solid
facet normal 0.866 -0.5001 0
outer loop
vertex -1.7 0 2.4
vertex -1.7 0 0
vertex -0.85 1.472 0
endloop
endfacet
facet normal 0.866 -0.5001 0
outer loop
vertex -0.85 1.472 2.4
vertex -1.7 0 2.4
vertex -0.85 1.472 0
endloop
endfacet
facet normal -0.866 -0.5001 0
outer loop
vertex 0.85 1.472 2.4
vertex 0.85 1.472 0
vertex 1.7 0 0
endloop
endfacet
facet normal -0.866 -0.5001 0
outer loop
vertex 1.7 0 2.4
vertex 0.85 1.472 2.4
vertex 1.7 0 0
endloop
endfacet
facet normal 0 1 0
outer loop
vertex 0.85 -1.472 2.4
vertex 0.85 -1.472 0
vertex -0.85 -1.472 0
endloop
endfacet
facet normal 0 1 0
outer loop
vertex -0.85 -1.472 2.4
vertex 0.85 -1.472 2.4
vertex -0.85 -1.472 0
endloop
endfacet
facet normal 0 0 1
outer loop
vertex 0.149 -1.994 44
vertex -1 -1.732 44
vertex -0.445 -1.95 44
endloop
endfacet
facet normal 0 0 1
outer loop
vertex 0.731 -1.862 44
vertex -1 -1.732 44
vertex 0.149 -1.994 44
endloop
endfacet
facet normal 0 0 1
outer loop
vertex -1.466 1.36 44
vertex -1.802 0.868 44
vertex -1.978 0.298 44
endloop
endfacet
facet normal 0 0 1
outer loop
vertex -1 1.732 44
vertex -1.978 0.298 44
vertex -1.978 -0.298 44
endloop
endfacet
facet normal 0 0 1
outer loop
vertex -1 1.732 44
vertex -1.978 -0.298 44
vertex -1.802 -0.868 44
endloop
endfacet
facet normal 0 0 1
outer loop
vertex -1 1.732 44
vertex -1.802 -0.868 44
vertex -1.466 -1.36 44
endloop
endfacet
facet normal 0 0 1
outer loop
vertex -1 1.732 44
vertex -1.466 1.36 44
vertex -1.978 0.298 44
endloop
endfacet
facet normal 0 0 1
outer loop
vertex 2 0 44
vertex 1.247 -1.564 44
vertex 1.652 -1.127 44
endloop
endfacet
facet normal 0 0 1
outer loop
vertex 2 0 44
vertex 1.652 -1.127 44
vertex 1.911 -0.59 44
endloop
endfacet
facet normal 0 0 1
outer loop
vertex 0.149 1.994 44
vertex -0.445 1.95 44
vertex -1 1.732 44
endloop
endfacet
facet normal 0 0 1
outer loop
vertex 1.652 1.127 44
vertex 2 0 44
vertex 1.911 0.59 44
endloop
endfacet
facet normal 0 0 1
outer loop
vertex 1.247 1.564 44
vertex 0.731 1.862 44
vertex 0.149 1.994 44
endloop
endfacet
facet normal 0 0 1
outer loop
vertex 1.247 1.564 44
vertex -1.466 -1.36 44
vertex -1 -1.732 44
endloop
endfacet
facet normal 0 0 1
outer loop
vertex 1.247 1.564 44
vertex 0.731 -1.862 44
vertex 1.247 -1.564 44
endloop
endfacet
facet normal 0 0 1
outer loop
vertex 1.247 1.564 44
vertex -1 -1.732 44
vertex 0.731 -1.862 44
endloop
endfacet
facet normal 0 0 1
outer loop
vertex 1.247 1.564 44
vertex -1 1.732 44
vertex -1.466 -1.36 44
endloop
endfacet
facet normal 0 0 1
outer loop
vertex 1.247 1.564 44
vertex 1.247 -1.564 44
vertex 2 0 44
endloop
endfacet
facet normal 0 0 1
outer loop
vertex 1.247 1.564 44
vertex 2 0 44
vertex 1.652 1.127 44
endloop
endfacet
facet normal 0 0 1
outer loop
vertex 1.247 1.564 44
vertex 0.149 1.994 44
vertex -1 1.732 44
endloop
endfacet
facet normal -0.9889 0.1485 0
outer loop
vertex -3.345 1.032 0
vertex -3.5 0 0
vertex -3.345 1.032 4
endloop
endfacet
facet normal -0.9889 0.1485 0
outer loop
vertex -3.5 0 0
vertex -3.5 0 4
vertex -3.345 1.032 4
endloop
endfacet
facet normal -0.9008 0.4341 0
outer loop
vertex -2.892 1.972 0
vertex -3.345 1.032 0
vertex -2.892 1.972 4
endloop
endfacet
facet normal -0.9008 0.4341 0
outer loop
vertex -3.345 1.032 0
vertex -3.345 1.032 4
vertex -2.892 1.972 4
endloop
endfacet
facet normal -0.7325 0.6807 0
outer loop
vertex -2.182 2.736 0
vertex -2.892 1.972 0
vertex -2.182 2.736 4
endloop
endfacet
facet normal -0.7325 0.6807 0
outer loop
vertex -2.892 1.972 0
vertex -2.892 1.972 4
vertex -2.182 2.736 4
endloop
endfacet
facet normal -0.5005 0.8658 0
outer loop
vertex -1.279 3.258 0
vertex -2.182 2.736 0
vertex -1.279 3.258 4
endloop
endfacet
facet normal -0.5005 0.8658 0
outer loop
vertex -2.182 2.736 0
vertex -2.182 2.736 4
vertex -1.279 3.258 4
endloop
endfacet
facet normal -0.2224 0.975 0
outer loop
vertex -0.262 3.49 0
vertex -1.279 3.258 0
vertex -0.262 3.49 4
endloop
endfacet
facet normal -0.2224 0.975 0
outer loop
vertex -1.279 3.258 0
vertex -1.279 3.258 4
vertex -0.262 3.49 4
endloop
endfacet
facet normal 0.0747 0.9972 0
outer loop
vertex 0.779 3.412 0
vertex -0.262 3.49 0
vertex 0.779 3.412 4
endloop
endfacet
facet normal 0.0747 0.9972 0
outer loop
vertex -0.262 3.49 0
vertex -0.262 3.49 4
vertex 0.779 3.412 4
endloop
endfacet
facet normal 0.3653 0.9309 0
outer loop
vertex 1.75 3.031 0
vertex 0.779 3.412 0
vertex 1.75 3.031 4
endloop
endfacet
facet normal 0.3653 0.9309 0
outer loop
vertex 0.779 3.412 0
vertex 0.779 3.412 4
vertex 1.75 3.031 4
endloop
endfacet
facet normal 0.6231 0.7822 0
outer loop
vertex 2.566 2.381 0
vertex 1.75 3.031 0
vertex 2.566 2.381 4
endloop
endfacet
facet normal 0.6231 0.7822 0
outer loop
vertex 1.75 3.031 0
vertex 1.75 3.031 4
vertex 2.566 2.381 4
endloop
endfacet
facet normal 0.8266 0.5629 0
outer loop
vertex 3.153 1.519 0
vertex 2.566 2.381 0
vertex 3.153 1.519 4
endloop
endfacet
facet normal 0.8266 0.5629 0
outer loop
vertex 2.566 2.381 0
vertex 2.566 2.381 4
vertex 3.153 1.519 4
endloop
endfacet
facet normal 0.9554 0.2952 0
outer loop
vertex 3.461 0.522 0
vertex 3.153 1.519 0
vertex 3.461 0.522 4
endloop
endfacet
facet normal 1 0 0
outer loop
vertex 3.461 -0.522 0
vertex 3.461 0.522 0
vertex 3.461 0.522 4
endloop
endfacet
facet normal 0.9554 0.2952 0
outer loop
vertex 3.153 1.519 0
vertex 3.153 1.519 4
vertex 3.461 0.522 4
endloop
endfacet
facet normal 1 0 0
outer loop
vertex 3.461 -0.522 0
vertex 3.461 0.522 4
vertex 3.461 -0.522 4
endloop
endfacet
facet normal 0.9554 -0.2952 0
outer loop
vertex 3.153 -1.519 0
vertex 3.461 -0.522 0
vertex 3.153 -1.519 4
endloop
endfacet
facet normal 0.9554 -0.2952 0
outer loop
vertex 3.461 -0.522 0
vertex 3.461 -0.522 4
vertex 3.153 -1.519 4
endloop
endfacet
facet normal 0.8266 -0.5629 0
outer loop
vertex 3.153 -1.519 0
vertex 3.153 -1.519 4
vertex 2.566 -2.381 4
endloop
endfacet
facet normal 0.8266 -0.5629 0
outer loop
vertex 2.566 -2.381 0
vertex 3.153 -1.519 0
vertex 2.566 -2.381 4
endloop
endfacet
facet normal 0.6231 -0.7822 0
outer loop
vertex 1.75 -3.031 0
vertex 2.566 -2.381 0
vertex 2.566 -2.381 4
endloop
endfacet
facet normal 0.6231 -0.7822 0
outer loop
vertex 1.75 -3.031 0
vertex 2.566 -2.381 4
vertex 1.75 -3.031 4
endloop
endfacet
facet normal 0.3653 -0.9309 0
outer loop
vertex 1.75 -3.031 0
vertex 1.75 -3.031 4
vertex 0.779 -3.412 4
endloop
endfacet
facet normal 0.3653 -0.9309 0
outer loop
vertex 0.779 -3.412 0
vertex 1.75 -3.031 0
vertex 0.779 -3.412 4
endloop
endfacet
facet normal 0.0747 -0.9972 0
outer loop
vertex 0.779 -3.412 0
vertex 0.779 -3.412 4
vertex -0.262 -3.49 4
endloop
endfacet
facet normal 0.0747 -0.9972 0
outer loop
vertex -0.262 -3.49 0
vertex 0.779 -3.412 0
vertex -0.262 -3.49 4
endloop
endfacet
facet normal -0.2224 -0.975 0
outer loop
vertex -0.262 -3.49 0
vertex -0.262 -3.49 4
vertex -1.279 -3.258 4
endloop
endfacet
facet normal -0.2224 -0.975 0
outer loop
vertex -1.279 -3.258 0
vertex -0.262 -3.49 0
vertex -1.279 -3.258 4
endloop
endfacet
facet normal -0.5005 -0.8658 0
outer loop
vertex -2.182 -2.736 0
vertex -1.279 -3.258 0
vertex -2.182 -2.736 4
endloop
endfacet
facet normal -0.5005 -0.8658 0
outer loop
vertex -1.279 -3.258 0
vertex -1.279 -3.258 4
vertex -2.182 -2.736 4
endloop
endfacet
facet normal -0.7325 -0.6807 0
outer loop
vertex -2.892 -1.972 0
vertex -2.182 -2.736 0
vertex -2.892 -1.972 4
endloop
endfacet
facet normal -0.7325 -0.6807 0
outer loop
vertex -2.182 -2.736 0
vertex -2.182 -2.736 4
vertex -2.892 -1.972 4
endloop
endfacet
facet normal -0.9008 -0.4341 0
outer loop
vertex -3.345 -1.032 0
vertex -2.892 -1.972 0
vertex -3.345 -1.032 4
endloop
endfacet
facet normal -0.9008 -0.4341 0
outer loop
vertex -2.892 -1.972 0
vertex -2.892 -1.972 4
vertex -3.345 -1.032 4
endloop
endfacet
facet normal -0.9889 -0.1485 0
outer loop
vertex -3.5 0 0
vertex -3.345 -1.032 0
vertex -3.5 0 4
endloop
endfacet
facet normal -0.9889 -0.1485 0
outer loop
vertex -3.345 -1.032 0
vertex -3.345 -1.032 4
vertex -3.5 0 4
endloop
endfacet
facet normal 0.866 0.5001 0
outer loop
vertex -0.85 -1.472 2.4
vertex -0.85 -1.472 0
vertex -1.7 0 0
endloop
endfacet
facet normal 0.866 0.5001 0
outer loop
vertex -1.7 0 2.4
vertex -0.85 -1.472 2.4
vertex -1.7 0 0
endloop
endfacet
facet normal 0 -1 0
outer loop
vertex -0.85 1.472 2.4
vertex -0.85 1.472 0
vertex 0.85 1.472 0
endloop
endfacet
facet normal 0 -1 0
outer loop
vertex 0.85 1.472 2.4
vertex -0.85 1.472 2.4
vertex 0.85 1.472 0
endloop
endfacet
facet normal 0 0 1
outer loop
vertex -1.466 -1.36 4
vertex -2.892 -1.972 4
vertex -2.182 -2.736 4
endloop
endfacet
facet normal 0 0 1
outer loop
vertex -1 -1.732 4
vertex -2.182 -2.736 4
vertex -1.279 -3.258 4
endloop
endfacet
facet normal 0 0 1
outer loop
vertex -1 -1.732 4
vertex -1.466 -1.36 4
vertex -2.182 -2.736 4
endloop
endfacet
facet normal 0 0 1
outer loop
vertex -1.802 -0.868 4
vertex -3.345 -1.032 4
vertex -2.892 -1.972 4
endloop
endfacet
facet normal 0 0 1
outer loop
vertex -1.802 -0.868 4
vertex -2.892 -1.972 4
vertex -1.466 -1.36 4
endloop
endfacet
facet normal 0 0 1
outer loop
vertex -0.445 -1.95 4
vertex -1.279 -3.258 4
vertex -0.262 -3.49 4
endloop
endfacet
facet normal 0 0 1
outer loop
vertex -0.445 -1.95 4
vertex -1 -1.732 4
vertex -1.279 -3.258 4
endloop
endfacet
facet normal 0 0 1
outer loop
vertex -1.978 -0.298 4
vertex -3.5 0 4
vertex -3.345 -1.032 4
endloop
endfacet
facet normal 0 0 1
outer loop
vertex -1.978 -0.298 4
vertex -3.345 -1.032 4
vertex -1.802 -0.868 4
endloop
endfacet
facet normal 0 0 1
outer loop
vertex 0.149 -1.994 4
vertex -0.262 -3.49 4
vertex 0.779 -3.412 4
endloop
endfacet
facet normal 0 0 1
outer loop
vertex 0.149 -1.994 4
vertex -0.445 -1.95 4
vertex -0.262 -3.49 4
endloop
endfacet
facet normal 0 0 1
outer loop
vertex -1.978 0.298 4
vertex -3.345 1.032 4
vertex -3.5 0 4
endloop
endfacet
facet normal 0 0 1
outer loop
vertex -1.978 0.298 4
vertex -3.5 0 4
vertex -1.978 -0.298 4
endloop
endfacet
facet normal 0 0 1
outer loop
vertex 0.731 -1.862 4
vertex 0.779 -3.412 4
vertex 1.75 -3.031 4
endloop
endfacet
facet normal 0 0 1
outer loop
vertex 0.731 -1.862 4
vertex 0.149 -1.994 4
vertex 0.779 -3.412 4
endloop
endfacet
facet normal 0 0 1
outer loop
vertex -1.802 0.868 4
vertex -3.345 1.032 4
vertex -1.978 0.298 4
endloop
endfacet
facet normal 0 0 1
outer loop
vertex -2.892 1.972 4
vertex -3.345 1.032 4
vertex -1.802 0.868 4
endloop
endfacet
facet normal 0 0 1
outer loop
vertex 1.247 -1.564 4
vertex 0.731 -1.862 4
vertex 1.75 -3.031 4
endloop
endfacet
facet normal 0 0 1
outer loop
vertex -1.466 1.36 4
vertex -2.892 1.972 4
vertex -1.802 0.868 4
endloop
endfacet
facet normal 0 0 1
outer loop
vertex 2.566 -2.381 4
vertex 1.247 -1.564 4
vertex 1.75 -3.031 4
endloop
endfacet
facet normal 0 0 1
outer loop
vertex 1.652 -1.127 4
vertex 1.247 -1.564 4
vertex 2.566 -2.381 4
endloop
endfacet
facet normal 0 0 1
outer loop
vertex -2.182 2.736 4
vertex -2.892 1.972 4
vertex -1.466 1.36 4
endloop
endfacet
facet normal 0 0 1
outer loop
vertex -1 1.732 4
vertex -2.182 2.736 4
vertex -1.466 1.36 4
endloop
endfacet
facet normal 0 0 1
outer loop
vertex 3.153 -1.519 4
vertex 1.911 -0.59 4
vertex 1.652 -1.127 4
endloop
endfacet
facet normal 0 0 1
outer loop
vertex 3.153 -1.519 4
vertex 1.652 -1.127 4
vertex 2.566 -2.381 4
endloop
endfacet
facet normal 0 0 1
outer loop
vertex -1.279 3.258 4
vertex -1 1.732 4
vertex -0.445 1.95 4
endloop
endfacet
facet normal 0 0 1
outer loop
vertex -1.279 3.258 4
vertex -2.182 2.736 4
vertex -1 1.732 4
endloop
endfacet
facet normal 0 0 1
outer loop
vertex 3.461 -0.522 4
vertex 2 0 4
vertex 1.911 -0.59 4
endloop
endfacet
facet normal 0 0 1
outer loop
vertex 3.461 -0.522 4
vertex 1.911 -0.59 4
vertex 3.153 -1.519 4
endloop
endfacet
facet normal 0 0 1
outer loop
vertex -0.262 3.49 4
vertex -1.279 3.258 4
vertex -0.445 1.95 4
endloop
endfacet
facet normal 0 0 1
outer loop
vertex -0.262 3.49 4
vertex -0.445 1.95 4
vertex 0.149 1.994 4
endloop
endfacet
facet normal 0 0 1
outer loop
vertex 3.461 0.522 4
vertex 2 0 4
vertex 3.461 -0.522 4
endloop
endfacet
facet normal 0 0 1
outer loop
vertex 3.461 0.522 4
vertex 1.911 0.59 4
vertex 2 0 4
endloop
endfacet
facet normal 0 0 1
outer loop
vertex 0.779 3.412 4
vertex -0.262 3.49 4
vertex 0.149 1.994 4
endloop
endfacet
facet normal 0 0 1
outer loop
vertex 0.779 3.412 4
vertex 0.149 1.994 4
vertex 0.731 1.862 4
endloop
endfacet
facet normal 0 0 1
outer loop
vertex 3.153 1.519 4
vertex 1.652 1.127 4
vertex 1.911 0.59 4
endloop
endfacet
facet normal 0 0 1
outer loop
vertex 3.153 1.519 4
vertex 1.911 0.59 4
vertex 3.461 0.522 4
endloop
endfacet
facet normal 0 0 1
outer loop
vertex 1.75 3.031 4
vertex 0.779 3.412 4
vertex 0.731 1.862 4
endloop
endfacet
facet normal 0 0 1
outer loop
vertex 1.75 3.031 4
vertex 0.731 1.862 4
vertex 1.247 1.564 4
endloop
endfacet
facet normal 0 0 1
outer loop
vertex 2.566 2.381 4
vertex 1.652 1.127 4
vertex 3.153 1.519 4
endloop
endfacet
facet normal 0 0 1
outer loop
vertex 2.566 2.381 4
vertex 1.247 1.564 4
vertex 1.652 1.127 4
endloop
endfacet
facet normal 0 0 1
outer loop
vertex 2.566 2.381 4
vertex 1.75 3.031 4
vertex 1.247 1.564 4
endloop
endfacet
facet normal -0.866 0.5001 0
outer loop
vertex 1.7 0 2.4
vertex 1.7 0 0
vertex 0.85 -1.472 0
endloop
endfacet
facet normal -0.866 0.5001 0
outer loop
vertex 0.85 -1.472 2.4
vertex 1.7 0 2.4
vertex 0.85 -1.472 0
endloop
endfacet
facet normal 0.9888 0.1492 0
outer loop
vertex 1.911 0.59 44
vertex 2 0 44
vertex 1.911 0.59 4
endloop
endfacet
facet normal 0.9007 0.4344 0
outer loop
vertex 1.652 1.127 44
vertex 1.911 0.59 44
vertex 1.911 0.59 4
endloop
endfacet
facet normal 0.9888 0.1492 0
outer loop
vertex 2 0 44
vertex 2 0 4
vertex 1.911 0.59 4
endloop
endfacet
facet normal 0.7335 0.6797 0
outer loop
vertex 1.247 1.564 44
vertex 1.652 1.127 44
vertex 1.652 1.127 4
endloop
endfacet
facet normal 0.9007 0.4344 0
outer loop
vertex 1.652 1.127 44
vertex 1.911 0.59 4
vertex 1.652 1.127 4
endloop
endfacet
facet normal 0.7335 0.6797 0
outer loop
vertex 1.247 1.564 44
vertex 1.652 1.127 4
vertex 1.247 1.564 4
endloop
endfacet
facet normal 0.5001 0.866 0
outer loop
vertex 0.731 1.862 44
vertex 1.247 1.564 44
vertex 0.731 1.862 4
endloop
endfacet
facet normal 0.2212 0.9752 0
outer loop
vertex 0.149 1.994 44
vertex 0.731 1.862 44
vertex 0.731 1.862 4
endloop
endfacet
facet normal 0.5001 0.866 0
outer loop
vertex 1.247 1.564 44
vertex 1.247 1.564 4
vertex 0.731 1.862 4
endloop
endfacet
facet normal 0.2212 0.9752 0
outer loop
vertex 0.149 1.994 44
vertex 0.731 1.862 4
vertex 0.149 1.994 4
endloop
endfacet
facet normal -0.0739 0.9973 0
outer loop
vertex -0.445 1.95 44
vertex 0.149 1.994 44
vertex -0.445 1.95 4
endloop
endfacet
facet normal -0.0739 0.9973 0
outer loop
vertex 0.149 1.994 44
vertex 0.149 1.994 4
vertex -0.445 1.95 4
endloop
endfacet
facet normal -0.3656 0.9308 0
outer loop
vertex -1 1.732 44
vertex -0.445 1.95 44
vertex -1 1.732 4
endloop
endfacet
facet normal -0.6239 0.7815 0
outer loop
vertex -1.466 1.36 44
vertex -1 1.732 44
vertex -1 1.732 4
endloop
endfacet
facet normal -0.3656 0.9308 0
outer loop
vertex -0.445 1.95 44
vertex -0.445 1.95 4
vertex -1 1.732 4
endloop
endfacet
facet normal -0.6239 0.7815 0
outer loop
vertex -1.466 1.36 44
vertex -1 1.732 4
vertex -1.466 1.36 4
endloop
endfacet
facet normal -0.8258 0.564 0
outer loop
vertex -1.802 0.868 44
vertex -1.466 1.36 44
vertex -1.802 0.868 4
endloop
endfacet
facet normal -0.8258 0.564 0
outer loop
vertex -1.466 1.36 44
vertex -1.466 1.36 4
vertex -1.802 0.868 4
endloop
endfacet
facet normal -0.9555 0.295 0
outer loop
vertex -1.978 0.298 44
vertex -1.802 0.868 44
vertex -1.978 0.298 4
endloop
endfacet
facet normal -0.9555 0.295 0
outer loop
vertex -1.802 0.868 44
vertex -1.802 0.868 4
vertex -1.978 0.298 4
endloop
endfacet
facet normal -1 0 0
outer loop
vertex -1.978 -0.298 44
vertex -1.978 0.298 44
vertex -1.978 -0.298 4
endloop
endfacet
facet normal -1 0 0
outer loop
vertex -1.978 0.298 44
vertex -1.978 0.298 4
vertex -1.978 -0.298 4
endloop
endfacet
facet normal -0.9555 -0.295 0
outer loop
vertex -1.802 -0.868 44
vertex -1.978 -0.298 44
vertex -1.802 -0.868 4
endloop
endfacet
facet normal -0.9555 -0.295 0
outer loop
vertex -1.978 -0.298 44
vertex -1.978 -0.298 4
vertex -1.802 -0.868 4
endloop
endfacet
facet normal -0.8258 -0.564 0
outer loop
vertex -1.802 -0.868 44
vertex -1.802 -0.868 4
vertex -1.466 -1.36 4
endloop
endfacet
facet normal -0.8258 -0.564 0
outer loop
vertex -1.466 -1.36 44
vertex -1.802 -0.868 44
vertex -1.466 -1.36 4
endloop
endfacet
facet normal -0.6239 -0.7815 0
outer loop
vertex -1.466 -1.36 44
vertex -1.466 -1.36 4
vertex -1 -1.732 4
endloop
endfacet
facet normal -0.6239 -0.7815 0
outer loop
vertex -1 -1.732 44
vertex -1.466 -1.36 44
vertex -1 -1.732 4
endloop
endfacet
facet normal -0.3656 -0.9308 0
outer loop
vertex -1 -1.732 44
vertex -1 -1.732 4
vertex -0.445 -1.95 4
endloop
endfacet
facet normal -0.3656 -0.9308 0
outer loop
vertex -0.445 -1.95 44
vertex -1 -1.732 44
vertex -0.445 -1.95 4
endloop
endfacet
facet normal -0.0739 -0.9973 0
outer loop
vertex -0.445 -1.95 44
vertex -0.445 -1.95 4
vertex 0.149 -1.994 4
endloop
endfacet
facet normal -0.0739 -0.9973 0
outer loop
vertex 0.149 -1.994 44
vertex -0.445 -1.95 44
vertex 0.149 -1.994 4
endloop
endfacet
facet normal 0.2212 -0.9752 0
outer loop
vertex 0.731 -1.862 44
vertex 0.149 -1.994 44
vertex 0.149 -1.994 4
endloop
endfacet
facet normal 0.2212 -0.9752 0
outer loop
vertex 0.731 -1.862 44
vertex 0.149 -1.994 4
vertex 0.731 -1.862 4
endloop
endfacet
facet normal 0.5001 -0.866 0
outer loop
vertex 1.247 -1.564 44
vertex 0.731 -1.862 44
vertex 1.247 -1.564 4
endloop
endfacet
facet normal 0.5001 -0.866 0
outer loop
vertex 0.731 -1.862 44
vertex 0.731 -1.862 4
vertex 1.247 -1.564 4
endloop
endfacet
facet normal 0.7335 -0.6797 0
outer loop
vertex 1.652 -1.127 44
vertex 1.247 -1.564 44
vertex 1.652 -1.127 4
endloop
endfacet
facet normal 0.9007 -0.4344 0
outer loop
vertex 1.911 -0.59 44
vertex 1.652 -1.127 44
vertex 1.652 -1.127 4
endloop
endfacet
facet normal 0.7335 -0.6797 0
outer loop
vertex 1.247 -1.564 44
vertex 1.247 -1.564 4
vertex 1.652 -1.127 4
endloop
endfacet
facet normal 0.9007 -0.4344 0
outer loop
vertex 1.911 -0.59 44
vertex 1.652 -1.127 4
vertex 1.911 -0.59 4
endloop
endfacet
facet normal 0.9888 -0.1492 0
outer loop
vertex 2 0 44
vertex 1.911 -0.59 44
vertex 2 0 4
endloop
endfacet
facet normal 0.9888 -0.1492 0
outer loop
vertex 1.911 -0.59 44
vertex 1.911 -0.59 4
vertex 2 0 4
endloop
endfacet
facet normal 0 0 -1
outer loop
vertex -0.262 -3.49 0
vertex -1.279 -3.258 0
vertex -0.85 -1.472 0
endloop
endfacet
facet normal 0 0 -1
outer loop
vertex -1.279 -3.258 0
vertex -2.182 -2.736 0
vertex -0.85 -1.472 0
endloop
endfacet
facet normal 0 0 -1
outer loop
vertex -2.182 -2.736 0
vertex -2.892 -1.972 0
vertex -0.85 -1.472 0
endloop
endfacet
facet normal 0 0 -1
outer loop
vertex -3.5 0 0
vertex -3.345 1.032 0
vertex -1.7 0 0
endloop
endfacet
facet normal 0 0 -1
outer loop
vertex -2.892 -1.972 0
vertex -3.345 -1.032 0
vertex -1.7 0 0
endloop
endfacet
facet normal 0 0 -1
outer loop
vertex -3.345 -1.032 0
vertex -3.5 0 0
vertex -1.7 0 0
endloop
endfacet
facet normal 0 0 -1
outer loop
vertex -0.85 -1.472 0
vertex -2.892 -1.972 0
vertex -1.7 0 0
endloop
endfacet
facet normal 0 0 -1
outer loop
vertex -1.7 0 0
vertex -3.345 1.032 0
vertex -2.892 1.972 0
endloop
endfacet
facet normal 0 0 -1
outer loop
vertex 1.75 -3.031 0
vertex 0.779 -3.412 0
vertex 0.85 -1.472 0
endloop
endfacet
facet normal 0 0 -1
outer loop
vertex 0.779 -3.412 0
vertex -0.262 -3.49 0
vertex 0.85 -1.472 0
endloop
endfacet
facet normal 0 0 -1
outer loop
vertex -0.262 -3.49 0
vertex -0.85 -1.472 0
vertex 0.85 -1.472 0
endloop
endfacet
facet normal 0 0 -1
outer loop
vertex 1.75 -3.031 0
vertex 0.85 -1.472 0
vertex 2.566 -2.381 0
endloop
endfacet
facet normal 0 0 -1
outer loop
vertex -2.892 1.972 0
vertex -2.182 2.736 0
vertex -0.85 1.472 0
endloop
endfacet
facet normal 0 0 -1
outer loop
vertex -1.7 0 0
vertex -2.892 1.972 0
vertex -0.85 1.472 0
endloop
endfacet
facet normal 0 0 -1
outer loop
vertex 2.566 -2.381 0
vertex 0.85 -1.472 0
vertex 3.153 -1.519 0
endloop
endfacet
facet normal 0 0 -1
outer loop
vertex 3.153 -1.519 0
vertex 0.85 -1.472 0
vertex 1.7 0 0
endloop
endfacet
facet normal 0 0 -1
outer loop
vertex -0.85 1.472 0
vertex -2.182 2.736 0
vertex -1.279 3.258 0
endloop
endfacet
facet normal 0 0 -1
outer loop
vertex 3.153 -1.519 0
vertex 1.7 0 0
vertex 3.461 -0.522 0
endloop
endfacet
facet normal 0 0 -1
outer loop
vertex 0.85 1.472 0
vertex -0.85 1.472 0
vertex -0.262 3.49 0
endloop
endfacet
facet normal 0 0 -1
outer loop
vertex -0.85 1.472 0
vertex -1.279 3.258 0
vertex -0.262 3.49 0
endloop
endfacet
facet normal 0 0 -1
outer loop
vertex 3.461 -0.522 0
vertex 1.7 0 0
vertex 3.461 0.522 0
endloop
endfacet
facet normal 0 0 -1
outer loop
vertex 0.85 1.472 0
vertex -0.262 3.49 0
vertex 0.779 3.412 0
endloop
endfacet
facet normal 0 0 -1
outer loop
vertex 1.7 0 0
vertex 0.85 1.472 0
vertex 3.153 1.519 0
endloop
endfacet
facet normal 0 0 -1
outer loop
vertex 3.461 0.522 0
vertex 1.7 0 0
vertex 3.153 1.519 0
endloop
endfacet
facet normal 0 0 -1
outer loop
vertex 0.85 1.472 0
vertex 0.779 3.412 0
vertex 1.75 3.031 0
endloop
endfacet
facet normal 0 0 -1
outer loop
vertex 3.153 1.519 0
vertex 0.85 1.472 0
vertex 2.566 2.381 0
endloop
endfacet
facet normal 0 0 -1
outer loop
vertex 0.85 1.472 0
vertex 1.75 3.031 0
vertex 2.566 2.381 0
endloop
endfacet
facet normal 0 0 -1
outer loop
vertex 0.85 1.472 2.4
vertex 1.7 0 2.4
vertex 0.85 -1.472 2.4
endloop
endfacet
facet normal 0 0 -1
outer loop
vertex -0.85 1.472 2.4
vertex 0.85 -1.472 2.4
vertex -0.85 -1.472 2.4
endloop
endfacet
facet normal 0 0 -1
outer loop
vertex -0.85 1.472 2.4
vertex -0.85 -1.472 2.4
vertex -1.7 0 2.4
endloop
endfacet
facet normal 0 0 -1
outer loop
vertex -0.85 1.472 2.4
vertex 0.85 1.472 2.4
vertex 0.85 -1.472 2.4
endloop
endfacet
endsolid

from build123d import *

# Parameters (mm, degrees)
SKETCH1_W           = 3.5
SKETCH1_H           = 4
SKETCH2_R           = 2
BOSS_EXTRUDE1_DEPTH = 20
SKETCH3_R           = 2
BOSS_EXTRUDE2_DEPTH = 20
CUT_EXTRUDE1_DEPTH  = 2.4


with BuildPart() as part:
    # Sketch1 → Revolve1 (revolve)
    with BuildSketch(Plane.XZ, mode=Mode.PRIVATE) as revolve1_sk:
        with Locations((1.75, 2)):
            Rectangle(SKETCH1_W, SKETCH1_H)
    revolve(revolve1_sk.sketch.rotate(Axis((0, 0, 4), (0, 0, -1)), 180), axis=Axis((0, 0, 4), (0, 0, -1)))

    # Sketch2 → Boss-Extrude1 (add)
    with BuildSketch(Plane.XY.offset(4)):
        Circle(SKETCH2_R)
    extrude(amount=BOSS_EXTRUDE1_DEPTH)

    # Sketch3 → Boss-Extrude2 (add)
    with BuildSketch(Plane.XY.offset(24)):
        Circle(SKETCH3_R)
    extrude(amount=BOSS_EXTRUDE2_DEPTH)

    # Sketch4 → Cut-Extrude1 (cut)
    with BuildSketch(Plane(origin=(0, 0, 0), x_dir=(-1, 0, 0), z_dir=(0, 0, -1))):
        Polygon((-1.7, 0), (-0.85, -1.472243186), (0.85, -1.472243186), (1.7, 0), (0.85, 1.472243186), (-0.85, 1.472243186), align=None)
    extrude(amount=-CUT_EXTRUDE1_DEPTH, mode=Mode.SUBTRACT)


solid = part.part
